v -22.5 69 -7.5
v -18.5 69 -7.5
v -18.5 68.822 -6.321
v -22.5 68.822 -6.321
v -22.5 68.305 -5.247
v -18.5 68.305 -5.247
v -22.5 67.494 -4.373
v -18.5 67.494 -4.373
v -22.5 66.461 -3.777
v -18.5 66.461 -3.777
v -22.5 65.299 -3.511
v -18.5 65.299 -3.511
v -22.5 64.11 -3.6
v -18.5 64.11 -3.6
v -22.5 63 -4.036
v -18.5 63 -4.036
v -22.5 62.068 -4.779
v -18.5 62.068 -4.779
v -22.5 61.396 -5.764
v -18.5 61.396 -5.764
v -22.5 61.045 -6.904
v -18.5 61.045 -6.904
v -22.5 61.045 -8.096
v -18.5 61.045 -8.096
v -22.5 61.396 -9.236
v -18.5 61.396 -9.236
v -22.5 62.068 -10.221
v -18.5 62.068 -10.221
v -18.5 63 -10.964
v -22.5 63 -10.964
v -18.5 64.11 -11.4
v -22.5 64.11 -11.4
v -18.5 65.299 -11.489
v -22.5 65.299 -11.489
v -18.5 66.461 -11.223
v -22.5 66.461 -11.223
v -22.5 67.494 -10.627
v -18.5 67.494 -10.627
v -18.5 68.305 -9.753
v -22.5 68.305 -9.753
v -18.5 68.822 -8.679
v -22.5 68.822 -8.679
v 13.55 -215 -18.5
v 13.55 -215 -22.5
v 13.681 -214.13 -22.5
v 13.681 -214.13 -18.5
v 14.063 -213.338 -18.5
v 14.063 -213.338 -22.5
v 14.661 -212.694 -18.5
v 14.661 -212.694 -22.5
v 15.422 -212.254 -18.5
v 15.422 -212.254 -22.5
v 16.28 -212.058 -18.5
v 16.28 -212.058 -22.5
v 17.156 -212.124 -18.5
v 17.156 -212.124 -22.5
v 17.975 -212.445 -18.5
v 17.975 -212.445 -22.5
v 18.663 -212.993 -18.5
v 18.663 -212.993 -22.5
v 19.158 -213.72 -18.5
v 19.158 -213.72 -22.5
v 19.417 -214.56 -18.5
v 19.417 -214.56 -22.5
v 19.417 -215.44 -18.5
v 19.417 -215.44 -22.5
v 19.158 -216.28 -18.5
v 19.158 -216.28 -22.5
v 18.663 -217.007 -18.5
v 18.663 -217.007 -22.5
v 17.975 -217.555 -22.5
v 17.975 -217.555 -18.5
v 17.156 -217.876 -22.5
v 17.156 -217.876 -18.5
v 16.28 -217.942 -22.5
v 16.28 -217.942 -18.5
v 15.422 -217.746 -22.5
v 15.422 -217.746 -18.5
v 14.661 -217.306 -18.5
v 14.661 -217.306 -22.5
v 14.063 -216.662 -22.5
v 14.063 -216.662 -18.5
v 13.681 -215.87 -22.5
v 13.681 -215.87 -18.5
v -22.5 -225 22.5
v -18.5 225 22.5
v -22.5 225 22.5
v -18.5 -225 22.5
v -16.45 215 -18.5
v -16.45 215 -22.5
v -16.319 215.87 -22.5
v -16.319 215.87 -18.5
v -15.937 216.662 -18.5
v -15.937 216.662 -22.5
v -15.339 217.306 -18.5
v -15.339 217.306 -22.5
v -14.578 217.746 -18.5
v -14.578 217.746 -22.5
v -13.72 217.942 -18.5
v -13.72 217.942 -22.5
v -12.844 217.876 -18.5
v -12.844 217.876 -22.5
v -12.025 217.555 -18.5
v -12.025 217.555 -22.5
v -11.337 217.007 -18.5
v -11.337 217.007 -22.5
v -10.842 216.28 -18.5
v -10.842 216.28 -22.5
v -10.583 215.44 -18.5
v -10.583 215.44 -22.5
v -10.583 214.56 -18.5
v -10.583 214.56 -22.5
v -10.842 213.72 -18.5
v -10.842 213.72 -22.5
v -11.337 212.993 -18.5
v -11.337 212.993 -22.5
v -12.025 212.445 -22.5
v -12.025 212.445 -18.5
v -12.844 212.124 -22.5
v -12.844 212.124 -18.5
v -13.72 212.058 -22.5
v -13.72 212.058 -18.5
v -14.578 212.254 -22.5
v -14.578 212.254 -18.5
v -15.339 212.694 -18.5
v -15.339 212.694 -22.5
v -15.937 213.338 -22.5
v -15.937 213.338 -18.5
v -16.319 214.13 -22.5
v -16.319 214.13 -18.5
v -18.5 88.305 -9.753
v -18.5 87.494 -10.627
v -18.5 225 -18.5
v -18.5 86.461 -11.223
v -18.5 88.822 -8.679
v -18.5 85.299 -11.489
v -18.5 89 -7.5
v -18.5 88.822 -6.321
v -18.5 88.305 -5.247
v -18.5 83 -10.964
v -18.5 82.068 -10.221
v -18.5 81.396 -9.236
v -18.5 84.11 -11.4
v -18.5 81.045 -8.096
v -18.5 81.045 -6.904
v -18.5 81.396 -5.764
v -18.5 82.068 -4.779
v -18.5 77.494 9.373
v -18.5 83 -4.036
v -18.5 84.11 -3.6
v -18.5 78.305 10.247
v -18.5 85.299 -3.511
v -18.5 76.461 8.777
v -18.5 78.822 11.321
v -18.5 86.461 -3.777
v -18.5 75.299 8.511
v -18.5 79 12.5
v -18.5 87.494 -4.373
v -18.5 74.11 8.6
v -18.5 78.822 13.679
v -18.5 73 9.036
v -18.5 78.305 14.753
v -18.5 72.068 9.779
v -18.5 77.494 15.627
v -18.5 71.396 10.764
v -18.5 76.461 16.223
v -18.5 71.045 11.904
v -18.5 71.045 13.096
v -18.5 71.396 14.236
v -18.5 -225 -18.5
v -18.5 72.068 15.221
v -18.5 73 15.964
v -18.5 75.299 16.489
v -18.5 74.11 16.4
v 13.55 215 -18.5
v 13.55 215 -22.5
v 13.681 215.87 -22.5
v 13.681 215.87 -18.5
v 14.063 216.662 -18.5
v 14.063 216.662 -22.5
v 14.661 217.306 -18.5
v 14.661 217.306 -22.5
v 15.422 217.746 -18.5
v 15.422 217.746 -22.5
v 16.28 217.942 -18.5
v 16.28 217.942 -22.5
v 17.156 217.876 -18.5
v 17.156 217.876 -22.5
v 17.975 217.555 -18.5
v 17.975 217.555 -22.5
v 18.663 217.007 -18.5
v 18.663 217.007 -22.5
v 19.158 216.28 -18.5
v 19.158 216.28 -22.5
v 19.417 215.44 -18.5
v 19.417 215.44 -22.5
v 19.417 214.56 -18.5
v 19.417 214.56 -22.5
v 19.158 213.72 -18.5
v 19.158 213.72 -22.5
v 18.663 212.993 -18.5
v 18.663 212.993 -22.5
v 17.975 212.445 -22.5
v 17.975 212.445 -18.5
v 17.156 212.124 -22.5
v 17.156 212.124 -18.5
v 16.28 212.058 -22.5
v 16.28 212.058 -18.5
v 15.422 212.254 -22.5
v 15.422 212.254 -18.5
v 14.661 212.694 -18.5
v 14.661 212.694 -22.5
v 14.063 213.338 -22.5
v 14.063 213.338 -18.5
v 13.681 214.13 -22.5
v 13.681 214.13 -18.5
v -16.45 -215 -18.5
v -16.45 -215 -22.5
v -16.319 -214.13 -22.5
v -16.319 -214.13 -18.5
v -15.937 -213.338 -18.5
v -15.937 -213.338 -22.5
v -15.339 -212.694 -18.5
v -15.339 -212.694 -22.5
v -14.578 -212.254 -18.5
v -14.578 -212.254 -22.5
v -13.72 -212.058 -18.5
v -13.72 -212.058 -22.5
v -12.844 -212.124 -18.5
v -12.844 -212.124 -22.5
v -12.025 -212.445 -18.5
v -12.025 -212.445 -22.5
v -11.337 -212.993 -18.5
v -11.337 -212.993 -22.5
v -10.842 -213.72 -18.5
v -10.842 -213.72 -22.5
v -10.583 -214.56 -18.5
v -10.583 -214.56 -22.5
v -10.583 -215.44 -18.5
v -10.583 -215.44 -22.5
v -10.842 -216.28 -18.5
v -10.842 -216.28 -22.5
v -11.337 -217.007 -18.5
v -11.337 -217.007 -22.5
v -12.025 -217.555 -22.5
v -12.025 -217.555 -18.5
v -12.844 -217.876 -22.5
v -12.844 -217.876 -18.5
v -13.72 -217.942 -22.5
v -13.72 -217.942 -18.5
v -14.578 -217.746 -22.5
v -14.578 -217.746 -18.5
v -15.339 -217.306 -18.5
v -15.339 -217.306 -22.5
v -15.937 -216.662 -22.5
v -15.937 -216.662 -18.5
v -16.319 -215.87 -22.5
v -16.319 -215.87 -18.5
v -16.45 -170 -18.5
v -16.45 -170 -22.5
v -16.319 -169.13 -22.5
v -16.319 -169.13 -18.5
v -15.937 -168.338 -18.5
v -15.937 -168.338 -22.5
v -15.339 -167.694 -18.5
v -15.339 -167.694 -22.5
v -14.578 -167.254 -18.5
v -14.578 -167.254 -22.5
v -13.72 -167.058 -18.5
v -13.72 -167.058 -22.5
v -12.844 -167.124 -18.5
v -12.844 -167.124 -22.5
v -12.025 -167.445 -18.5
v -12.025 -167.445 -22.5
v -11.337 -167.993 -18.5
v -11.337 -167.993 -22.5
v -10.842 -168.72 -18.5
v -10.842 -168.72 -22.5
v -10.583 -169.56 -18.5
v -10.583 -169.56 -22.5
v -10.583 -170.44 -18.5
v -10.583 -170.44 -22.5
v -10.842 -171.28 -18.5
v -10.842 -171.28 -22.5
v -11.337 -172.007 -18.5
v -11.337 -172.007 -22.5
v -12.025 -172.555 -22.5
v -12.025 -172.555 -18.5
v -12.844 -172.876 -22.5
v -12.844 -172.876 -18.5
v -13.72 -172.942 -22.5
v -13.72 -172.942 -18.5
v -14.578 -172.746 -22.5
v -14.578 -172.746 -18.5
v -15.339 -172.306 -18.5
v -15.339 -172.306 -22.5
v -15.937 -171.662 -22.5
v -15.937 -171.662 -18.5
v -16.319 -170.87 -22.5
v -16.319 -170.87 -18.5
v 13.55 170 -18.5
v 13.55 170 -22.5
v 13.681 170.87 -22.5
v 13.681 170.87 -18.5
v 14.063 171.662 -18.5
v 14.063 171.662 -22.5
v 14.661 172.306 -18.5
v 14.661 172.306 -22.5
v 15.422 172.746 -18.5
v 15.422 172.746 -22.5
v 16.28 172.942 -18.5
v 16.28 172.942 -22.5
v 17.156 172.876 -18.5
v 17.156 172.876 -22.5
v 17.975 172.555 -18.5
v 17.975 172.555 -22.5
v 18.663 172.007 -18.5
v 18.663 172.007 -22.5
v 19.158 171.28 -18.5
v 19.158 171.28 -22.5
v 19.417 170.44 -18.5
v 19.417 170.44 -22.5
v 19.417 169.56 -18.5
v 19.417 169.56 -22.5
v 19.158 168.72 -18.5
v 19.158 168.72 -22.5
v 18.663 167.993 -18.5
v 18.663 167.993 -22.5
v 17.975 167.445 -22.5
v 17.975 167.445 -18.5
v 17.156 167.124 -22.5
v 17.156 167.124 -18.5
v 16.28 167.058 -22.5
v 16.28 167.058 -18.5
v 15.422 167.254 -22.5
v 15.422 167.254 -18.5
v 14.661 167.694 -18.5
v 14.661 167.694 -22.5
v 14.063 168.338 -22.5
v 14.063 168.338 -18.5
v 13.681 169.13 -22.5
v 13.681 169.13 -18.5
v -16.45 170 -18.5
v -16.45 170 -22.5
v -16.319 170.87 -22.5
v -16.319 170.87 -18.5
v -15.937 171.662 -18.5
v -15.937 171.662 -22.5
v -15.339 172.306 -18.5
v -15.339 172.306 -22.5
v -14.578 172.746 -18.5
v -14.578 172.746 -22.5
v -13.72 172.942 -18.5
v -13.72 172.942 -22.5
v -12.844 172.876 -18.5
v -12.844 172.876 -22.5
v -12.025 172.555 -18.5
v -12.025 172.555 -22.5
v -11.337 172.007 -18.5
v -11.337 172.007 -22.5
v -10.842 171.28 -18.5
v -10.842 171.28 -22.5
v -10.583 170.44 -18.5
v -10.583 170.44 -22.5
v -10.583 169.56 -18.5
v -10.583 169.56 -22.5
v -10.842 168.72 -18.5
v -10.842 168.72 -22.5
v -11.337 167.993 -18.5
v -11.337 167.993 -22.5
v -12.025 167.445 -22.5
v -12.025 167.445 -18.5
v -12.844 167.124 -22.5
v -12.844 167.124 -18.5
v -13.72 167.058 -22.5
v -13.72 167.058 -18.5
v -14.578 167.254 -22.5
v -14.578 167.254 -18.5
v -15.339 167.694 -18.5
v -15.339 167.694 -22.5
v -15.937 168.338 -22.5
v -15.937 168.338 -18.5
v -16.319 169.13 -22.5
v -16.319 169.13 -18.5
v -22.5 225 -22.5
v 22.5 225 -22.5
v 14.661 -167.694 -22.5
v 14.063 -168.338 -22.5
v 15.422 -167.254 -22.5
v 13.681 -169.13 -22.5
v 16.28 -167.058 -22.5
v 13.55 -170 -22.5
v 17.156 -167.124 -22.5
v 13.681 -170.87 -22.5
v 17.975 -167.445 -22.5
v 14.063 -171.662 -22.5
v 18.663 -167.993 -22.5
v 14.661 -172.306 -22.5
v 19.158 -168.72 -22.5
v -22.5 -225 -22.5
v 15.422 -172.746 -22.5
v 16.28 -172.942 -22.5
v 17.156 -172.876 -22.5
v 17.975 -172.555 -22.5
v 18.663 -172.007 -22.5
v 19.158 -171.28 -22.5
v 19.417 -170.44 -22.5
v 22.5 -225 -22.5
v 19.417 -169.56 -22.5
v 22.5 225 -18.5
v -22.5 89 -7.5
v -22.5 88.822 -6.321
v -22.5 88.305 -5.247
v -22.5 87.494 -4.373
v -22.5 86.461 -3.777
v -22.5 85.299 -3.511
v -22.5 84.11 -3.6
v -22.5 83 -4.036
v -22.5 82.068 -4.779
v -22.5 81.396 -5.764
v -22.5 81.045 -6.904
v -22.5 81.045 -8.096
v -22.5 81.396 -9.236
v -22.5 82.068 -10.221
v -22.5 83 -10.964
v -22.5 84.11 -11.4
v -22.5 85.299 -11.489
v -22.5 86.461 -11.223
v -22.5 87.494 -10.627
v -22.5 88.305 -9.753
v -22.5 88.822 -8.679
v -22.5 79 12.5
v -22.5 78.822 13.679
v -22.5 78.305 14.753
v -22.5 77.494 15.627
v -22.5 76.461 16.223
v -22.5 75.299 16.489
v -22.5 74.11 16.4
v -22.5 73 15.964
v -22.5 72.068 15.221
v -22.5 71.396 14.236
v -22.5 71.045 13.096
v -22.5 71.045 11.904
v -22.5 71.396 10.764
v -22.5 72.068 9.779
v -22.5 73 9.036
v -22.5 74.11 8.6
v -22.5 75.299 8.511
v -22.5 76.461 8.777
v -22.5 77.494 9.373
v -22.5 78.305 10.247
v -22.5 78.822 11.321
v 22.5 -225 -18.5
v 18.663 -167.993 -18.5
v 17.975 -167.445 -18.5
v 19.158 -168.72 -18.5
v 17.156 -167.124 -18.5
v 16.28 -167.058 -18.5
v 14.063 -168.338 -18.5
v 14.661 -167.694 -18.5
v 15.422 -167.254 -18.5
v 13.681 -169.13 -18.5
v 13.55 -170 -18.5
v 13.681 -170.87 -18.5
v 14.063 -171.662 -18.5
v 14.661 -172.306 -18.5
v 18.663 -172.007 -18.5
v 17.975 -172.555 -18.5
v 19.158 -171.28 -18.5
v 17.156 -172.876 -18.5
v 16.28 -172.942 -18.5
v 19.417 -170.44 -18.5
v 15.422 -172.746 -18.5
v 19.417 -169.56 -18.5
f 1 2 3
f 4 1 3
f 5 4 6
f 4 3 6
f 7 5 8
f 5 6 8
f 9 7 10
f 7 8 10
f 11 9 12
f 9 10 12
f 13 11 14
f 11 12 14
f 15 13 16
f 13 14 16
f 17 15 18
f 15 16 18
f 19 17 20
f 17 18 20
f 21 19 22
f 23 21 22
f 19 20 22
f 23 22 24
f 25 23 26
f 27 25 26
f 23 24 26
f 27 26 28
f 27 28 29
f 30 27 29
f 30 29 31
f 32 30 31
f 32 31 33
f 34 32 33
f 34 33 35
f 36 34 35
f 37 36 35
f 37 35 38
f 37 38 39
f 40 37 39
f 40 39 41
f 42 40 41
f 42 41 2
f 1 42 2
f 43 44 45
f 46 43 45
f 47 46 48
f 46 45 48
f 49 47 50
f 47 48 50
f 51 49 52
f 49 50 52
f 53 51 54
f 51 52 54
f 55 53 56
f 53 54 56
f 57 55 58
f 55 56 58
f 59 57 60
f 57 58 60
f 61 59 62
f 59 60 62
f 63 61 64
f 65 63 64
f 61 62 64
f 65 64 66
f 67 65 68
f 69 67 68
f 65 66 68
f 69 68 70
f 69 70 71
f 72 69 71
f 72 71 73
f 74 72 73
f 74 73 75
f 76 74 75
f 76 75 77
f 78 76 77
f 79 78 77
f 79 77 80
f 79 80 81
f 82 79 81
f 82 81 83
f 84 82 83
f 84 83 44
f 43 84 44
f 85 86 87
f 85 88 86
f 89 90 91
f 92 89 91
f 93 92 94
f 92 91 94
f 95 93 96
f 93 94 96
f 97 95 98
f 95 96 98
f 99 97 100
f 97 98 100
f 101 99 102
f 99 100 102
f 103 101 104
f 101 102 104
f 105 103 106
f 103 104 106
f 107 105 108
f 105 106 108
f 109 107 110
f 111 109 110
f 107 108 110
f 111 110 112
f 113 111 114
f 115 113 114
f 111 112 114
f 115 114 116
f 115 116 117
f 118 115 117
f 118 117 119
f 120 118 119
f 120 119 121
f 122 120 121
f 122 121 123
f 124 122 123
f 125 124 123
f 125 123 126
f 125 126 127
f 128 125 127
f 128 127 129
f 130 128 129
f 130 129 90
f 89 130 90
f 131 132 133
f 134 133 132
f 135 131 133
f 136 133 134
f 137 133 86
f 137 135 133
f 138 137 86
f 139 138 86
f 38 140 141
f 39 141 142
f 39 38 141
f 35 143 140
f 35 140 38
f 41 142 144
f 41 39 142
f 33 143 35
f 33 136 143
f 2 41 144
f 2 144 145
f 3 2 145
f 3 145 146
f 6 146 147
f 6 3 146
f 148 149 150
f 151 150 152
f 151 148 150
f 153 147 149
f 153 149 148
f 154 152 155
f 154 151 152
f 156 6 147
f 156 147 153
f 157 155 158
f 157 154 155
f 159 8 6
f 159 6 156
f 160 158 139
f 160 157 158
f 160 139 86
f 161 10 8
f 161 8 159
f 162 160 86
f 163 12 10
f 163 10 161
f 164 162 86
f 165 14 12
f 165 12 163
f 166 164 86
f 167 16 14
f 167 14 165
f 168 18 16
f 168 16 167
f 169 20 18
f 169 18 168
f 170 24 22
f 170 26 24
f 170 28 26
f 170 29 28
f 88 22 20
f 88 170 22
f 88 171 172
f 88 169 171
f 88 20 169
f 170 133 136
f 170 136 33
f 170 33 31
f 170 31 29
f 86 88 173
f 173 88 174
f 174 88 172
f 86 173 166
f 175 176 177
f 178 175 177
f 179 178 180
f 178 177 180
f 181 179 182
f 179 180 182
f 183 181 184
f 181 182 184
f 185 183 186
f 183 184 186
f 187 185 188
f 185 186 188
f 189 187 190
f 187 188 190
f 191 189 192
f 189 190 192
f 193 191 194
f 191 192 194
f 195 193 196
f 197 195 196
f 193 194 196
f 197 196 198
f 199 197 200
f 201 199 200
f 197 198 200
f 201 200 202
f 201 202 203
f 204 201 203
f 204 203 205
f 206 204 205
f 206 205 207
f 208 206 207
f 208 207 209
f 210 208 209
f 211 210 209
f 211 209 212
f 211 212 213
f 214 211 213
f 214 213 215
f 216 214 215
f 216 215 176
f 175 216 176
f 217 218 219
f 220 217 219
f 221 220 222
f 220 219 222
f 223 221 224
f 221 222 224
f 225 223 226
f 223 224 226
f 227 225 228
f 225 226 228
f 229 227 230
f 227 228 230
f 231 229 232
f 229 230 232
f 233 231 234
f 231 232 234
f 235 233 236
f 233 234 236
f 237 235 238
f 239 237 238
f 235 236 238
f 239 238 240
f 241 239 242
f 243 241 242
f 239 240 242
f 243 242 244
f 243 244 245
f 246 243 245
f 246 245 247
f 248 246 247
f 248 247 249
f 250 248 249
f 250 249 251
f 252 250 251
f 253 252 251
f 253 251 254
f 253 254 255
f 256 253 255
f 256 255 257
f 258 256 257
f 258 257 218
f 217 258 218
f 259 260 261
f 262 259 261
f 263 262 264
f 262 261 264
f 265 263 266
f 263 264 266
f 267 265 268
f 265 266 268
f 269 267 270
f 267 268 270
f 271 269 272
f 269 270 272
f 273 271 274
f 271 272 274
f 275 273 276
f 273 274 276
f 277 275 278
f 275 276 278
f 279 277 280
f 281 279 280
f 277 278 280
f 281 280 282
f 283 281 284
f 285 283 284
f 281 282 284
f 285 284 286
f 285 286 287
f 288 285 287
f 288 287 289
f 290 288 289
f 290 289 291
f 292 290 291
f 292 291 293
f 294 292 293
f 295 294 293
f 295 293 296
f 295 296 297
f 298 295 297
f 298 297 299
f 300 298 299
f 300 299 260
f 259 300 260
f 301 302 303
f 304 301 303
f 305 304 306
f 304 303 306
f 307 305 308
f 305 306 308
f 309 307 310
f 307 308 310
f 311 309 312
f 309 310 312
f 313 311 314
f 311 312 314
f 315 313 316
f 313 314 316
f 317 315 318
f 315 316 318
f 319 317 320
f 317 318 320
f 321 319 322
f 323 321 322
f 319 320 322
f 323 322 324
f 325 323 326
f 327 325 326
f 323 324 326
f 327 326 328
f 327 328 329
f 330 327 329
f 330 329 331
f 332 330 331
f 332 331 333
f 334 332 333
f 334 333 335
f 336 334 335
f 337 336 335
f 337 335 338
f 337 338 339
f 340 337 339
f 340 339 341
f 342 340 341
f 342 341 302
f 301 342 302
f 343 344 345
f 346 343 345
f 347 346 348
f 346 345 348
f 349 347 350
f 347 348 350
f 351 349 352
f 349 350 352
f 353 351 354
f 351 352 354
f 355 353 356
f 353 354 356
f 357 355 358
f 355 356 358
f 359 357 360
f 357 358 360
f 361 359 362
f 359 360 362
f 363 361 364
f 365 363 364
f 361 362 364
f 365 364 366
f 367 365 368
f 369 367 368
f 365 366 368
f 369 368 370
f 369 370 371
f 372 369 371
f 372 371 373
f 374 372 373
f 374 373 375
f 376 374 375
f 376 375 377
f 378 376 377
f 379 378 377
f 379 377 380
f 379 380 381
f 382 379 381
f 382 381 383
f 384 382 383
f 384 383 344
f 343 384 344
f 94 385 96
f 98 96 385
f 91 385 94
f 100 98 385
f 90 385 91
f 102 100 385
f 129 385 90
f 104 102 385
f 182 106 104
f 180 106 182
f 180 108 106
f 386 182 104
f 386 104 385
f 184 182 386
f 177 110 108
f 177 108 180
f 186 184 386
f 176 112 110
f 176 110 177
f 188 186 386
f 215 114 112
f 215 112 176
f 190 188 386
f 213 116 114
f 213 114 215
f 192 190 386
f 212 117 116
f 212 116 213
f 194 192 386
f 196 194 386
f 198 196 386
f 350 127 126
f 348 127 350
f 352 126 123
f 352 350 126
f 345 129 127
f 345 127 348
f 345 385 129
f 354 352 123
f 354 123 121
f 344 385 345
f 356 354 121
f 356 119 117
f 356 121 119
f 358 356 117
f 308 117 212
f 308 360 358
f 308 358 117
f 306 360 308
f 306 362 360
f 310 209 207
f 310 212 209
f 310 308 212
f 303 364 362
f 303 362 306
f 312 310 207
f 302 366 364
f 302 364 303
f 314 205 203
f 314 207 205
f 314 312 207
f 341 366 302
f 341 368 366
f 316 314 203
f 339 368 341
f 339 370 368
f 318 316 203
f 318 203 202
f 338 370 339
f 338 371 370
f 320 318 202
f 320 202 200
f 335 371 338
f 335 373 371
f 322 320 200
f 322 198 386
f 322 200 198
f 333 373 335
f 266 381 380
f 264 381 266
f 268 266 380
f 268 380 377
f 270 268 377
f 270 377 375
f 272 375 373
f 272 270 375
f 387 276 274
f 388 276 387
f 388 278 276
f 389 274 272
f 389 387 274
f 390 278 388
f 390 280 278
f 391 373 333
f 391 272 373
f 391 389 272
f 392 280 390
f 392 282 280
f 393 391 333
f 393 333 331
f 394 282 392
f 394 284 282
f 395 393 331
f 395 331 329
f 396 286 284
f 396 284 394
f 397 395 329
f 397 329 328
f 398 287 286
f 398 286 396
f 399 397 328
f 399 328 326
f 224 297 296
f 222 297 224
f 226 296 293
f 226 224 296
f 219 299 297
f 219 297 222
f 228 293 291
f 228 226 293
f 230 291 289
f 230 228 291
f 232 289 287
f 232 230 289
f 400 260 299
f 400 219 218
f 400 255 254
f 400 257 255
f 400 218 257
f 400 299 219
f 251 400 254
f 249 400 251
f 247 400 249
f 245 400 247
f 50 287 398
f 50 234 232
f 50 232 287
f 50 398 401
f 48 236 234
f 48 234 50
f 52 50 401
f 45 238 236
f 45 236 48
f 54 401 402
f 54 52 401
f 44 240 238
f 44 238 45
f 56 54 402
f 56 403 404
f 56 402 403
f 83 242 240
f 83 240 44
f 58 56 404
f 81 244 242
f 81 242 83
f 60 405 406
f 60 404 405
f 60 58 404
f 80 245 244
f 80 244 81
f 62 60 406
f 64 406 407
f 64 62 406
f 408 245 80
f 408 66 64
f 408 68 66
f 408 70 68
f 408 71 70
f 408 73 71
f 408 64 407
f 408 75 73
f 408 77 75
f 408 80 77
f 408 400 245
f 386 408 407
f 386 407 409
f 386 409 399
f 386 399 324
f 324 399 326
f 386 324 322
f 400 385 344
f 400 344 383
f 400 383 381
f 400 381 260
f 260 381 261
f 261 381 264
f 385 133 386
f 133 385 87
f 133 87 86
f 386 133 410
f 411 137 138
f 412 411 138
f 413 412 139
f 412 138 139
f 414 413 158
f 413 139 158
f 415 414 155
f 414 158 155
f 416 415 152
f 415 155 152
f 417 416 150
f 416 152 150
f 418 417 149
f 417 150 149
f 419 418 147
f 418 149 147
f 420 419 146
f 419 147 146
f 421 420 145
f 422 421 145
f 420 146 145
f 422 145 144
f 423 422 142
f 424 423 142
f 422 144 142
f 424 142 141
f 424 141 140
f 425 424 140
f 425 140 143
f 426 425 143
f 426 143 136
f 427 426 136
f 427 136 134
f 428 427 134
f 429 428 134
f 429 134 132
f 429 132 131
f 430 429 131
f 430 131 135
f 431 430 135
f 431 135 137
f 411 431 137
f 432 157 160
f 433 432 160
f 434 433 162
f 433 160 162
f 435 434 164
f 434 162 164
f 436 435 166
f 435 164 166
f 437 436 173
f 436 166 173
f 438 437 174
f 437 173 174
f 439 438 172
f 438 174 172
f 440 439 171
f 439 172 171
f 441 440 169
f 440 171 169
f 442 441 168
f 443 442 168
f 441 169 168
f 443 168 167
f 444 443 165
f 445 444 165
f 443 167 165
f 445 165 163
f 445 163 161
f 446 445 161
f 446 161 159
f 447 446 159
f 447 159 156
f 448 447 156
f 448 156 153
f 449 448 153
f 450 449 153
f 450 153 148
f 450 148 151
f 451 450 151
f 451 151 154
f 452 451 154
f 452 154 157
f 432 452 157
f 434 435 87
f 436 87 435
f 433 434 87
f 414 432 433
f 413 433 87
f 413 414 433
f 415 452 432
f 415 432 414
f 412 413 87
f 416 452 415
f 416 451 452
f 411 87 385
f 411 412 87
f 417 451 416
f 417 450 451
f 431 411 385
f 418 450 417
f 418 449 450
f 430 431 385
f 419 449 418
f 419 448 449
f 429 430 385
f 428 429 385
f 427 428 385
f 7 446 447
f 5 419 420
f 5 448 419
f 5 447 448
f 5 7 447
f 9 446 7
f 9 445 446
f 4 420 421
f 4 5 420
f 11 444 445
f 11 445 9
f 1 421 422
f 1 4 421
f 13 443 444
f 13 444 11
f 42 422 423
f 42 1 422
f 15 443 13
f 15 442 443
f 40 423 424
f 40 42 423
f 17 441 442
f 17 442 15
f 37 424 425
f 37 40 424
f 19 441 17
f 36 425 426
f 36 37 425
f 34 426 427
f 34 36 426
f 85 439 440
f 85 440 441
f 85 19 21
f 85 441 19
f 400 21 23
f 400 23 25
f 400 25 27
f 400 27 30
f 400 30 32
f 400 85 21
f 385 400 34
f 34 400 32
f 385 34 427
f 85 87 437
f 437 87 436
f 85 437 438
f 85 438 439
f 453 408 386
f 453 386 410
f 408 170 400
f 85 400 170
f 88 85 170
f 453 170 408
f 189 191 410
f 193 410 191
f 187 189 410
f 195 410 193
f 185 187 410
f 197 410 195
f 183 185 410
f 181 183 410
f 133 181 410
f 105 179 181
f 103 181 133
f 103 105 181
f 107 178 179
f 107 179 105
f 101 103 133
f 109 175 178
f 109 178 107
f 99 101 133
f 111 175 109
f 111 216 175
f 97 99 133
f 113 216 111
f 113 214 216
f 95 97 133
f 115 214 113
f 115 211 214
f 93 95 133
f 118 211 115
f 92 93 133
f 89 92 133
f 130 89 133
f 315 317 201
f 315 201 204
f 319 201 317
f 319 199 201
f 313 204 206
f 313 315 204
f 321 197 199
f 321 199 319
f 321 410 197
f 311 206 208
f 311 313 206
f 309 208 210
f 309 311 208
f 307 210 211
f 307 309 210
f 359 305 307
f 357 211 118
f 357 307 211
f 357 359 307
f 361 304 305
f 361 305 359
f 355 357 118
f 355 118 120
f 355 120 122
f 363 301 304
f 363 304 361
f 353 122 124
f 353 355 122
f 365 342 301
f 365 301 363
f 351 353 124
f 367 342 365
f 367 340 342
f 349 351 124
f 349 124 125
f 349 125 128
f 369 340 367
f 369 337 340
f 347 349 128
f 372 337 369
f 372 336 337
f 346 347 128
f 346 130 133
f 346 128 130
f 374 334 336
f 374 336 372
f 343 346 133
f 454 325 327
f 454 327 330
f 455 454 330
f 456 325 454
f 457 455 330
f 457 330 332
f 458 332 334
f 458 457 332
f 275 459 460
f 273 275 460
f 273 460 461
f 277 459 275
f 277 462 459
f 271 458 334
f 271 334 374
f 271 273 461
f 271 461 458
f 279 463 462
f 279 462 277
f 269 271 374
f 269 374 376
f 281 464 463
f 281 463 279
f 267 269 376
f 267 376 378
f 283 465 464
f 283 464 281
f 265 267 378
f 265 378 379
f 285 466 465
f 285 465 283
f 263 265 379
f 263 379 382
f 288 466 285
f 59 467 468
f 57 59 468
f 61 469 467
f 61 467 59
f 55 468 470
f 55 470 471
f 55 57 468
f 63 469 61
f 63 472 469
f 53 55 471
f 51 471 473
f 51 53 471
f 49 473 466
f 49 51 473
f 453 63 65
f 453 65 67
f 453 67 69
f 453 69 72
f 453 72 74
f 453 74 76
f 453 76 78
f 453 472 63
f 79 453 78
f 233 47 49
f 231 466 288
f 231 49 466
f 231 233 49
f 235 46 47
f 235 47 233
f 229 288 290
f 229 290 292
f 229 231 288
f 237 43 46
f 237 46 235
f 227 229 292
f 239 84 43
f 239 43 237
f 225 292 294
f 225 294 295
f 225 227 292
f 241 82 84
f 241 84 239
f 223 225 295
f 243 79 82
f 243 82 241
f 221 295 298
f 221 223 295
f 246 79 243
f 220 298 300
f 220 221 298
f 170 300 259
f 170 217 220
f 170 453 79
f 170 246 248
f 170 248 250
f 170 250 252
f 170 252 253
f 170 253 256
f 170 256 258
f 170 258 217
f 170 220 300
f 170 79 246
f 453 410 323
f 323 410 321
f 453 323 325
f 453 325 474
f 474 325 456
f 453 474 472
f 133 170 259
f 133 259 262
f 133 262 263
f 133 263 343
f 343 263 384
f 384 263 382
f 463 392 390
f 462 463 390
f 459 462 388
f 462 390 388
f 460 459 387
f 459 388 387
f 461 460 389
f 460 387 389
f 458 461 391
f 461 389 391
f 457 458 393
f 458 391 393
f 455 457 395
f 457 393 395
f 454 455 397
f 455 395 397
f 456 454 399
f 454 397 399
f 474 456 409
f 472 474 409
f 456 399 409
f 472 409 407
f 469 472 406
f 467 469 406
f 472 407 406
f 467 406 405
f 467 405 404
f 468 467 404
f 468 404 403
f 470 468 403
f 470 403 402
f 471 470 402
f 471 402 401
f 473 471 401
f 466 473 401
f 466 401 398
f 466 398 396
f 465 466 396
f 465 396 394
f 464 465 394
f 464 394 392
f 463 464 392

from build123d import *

# Parameters (mm, degrees)
F1_DEPTH = 225
F3_D     = 8
F5_D     = 5.9


with BuildPart() as f1:
    # F0 (on Front) → F1 (new body, symmetric)
    with BuildSketch(Plane.XZ):
        Polygon((-22.5, -22.5), (22.5, -22.5), (22.5, -18.5), (-18.5, -18.5), (-18.5, 22.5), (-22.5, 22.5), align=None)
    extrude(amount=F1_DEPTH, both=True)

    # F3 (through all)
    with Locations(Plane(origin=(-22.5, 0, 0), x_dir=(0, -1, 0), z_dir=(-1, 0, 0))):
        with Locations((-75, 12.5), (-85, -7.5), (-65, -7.5)):
            Hole(F3_D / 2)

    # F5 (through all)
    with Locations(Plane.XY.offset(-18.5)):
        with Locations((-13.5, -170), (16.5, -170), (16.5, -215), (-13.5, -215), (-13.5, 215), (16.5, 215), (16.5, 170), (-13.5, 170)):
            Hole(F5_D / 2)


solid = f1.part
